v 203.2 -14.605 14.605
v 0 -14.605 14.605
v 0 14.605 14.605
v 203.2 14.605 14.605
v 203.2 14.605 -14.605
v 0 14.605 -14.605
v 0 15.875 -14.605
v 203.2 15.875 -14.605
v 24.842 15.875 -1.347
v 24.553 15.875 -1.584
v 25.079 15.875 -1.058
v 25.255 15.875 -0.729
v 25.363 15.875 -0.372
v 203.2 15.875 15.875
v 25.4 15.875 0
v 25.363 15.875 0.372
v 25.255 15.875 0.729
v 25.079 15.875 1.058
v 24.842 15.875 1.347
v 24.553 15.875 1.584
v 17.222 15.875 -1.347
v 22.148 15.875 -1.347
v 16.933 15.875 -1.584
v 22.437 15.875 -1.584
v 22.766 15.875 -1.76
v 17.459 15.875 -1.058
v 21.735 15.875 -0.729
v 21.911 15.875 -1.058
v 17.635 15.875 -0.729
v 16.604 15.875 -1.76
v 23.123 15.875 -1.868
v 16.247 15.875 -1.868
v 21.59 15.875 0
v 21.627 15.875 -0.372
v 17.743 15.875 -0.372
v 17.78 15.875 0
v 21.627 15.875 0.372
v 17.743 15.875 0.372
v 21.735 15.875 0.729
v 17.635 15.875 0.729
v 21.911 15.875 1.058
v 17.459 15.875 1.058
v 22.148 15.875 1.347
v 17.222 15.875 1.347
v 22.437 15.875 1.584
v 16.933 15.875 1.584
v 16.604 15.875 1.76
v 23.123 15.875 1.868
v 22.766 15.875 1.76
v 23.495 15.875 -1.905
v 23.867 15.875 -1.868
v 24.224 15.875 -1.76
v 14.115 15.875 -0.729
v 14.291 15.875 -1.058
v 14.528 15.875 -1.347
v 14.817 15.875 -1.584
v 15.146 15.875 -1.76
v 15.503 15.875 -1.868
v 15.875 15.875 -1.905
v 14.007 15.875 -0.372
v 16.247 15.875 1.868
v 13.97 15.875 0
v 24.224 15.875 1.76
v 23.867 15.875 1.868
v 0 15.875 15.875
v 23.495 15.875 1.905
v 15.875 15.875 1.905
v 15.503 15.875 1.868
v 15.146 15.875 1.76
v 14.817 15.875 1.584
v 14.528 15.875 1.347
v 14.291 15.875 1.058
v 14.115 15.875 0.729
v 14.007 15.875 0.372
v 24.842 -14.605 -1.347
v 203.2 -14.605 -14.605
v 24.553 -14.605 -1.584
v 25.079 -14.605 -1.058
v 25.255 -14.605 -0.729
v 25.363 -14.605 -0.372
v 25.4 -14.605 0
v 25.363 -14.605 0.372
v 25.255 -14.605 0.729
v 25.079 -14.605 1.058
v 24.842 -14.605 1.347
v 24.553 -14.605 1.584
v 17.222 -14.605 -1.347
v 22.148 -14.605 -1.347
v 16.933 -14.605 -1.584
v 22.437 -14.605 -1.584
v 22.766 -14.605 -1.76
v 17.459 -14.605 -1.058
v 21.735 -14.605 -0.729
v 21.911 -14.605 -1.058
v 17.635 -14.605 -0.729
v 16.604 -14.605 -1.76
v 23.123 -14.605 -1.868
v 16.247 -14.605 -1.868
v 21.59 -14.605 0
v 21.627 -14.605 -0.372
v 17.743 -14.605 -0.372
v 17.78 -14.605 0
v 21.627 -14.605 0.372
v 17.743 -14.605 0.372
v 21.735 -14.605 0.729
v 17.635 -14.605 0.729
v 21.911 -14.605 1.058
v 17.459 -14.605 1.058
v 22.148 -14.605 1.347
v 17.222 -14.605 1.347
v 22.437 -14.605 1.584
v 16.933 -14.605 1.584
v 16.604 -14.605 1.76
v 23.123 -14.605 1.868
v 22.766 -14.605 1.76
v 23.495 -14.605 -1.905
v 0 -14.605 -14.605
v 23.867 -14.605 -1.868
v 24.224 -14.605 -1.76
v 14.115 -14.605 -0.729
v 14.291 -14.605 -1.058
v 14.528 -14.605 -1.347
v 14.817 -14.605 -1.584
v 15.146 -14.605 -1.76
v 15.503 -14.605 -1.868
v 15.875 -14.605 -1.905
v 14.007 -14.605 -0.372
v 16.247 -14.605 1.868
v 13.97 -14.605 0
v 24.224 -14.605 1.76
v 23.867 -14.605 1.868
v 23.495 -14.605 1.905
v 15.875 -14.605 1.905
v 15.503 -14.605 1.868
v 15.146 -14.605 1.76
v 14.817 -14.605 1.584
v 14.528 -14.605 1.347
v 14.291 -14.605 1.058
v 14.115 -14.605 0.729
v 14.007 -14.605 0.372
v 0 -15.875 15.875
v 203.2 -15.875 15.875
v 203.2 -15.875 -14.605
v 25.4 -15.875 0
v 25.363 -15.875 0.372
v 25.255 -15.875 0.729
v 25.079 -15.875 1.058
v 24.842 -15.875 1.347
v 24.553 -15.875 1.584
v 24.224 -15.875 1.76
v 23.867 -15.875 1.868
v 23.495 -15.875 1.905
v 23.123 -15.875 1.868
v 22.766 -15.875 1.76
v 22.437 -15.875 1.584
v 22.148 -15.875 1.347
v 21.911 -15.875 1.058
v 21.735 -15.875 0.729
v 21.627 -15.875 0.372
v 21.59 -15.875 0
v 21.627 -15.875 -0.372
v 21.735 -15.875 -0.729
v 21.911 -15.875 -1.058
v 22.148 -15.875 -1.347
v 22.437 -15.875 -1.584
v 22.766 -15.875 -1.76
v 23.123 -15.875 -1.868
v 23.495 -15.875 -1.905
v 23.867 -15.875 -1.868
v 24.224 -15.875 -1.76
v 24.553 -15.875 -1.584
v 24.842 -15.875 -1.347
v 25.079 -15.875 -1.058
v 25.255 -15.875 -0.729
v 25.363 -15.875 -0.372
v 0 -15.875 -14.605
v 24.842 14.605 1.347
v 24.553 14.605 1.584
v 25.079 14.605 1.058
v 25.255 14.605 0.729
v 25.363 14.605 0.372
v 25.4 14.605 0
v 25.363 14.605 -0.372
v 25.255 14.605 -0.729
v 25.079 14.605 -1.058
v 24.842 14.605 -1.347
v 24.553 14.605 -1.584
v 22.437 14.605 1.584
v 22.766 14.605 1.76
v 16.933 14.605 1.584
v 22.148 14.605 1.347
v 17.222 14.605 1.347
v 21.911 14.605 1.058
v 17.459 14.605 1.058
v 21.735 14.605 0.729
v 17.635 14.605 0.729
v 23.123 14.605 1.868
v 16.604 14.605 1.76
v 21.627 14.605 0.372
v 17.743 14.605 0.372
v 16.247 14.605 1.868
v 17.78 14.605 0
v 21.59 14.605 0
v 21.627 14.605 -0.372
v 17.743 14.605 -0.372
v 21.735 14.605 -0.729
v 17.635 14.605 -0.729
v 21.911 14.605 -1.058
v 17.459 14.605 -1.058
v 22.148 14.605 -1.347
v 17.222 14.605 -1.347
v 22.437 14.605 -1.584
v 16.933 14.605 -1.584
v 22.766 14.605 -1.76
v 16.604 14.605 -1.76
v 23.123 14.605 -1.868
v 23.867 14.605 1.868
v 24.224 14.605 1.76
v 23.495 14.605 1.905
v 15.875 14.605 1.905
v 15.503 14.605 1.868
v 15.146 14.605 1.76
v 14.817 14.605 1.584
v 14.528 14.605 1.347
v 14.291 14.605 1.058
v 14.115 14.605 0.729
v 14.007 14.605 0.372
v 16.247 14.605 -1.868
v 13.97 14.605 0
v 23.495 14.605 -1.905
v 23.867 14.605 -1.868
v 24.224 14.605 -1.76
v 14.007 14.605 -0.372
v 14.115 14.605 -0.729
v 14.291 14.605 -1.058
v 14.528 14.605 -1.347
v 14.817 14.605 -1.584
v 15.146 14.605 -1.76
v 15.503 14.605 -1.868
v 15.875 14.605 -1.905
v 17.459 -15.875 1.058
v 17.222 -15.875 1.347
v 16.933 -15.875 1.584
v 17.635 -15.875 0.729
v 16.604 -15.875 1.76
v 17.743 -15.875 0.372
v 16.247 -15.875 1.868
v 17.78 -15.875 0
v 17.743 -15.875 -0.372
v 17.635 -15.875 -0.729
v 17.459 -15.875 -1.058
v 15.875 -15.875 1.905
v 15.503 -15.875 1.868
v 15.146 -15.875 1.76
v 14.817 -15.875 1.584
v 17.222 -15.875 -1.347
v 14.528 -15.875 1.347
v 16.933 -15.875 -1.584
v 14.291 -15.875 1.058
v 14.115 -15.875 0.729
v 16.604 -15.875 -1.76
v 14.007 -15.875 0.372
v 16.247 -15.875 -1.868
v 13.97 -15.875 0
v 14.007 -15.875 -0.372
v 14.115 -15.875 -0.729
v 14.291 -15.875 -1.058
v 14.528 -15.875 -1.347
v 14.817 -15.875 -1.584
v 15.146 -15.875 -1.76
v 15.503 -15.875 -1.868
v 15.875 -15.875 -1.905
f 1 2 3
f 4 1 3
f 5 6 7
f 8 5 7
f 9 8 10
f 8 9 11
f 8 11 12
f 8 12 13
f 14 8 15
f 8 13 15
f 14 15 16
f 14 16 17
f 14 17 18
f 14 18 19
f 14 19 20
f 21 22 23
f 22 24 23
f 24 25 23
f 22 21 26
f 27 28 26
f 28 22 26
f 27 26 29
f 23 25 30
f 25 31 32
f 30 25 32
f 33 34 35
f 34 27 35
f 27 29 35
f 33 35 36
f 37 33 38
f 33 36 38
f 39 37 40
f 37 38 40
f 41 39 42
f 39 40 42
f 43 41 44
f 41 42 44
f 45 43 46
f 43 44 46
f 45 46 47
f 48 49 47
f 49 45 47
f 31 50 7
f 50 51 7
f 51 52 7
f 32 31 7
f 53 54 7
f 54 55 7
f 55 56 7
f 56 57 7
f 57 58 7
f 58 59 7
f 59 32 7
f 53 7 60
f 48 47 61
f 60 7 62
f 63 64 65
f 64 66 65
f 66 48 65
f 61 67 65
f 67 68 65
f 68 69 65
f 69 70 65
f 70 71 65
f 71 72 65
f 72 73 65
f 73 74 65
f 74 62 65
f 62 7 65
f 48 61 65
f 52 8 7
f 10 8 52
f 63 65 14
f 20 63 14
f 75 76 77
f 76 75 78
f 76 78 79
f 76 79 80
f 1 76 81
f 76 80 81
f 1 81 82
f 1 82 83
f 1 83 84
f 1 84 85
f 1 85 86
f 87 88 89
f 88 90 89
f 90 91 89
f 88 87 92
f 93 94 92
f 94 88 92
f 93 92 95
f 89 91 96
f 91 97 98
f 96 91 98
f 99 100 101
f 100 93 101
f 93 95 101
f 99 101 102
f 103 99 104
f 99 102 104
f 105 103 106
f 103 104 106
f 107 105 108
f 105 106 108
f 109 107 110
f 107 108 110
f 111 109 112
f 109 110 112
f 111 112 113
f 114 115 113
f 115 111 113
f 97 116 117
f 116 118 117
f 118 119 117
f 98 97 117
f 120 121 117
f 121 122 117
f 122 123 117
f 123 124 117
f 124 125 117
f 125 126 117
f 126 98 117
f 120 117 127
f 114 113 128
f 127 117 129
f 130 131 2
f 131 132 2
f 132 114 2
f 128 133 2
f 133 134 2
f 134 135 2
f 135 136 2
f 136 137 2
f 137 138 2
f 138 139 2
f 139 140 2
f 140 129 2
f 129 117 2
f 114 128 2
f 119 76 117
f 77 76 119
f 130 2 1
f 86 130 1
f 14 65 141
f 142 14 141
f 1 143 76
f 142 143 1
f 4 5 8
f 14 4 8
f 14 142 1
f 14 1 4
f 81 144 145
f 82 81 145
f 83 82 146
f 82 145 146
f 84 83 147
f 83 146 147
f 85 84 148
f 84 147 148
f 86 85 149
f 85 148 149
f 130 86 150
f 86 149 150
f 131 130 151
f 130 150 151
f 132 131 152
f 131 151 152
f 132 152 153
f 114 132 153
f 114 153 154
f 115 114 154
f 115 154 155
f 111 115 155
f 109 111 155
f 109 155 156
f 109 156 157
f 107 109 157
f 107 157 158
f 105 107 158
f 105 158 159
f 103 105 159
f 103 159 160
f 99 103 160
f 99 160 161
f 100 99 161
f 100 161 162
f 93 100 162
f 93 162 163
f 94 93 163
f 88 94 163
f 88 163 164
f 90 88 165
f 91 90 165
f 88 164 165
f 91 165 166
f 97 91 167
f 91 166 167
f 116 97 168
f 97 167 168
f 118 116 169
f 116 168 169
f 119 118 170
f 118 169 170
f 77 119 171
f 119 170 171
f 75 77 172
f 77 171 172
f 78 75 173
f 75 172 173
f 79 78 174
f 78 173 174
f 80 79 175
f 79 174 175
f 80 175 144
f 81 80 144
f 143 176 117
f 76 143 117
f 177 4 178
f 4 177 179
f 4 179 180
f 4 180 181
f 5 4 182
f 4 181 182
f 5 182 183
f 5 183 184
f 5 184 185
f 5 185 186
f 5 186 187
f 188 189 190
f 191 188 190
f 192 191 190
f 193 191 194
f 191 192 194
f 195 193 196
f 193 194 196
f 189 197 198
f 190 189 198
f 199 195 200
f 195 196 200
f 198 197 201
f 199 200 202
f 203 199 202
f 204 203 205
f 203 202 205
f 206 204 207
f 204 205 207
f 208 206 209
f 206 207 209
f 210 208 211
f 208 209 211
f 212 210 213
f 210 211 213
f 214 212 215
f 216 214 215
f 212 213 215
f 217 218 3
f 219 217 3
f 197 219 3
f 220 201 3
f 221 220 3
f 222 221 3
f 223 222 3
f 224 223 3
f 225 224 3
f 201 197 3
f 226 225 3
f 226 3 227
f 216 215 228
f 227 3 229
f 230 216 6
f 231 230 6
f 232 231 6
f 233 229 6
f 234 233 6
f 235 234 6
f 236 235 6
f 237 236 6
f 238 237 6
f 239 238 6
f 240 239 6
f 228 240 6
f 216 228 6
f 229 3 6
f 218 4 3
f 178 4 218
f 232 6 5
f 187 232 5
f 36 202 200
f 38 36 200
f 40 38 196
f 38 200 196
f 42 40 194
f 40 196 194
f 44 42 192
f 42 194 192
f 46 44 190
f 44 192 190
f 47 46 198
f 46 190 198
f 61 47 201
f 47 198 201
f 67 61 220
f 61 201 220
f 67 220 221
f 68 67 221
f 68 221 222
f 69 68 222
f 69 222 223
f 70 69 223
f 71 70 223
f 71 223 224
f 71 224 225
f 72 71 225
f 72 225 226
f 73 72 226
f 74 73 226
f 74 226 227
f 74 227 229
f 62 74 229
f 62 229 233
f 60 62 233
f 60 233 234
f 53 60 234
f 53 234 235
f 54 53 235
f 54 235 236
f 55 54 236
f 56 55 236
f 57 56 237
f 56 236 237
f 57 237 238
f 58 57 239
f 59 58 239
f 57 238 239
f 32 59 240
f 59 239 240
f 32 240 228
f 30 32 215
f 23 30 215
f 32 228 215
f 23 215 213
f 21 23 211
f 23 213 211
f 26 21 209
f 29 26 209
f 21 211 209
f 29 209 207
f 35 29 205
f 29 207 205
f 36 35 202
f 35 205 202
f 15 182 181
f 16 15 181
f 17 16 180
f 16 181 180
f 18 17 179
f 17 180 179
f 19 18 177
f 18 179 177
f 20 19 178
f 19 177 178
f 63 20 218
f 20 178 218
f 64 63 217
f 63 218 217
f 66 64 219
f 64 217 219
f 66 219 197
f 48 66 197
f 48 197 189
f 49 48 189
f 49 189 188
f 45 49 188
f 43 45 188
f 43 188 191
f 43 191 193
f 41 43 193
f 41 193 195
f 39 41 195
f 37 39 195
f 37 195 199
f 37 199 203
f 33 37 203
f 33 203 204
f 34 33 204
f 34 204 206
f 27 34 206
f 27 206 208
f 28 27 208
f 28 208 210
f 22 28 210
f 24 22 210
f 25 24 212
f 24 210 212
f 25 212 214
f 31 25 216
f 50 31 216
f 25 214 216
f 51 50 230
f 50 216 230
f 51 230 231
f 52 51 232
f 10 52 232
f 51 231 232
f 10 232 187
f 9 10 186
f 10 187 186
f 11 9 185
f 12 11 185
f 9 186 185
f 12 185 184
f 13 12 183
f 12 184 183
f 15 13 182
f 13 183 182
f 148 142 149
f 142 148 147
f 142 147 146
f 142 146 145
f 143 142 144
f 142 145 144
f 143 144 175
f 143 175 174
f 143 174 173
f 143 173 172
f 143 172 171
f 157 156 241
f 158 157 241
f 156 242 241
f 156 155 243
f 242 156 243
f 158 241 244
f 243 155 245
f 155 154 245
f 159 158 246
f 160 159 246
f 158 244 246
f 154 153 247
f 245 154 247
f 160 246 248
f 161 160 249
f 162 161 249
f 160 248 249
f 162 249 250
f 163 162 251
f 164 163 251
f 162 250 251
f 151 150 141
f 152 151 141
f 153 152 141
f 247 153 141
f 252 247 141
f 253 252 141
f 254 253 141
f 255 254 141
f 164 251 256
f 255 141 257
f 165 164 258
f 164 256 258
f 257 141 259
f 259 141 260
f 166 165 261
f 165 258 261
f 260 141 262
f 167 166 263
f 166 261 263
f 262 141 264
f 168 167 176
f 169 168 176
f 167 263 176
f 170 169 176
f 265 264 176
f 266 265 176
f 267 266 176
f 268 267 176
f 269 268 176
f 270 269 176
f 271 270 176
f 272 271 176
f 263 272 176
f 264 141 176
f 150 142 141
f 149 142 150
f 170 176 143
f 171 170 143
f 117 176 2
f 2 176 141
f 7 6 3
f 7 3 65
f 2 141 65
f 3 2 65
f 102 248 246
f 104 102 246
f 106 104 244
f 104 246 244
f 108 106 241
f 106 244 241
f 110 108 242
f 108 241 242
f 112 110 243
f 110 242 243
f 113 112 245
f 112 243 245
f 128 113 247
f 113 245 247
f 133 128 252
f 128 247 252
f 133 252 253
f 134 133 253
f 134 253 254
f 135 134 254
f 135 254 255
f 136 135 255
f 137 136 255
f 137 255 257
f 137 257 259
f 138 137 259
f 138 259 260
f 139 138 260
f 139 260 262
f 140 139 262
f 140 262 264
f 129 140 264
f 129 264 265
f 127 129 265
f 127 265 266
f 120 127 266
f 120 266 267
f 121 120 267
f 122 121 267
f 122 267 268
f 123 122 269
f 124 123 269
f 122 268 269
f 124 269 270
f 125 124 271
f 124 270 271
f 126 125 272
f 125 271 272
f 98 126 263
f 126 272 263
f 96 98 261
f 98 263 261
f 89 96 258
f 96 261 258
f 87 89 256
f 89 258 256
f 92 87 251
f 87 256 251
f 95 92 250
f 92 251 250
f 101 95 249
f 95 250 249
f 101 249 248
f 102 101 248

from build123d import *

# Parameters (mm, degrees)
F1_DEPTH = 203.2
F2_R     = 1.905
F3_DEPTH = 31.751


with BuildPart() as f1:
    # F0 (on Right) → F1 (new body)
    with BuildSketch(Plane.YZ):
        Polygon((15.875, -14.605), (15.875, 15.875), (-15.875, 15.875), (-15.875, -14.605), (-14.605, -14.605), (-14.605, 14.605), (14.605, 14.605), (14.605, -14.605), align=None)
    extrude(amount=F1_DEPTH)

    # F2 (on face) → F3 (cut, through all)
    with BuildSketch(Plane.XZ.offset(15.875)):
        with Locations((15.875, 0)):
            Circle(F2_R)
        with Locations((23.495, 0)):
            Circle(F2_R)
    extrude(amount=-F3_DEPTH, mode=Mode.SUBTRACT)


solid = f1.part
